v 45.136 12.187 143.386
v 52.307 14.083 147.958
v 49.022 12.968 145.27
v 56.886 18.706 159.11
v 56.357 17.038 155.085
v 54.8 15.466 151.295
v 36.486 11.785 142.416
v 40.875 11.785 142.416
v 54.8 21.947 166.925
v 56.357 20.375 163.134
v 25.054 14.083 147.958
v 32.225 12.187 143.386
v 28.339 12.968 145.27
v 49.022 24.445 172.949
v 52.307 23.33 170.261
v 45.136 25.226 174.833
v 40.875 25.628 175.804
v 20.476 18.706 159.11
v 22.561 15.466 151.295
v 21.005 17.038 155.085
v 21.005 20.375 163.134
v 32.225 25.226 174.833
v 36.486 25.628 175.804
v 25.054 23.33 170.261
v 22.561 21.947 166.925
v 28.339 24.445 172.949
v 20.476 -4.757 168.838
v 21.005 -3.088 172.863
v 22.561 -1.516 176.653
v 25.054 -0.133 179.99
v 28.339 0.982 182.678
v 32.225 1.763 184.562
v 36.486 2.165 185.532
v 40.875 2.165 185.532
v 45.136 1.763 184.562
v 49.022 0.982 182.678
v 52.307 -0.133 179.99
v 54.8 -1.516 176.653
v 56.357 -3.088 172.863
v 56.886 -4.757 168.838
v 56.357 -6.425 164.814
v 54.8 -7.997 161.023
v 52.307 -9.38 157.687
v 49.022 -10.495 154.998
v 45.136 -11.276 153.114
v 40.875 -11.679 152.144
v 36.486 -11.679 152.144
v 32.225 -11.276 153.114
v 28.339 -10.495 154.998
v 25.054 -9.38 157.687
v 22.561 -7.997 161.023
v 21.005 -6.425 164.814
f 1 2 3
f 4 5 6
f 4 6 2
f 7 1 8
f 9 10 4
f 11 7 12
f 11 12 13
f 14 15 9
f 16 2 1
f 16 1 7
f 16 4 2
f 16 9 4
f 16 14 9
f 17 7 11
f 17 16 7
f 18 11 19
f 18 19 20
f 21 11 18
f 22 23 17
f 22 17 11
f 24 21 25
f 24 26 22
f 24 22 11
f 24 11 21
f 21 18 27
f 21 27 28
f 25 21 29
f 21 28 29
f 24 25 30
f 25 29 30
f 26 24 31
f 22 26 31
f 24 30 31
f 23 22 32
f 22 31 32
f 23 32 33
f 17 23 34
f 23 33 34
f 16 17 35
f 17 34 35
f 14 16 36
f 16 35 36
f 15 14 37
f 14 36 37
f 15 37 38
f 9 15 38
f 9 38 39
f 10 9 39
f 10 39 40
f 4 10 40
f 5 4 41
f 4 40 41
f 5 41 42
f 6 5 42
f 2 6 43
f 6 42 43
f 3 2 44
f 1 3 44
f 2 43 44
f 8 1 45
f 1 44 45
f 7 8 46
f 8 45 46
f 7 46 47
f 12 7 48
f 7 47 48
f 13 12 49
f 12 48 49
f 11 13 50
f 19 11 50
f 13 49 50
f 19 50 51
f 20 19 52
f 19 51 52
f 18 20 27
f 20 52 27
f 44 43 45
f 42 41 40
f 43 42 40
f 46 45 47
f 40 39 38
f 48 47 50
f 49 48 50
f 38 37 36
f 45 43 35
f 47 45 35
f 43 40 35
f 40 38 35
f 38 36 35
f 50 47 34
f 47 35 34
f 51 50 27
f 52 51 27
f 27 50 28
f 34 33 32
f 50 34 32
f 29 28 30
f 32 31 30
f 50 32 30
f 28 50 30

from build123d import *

# Parameters (mm, degrees)
F4_DEPTH     = 31.75
F6_DEPTH     = 80.772
F7_W         = 115.0478571653
F7_H         = 280.0295129418
F8_DEPTH     = 80.01
F10_R        = 5.08
F11_R        = 5.08
F12_R        = 1.27
F13_T4_DEPTH = 185.7457951761
F13_T9_DEPTH = 185.7457951761
F15_R        = 18.2048484519
F16_DEPTH    = 25.4


# Not quite as in the source:
# - a fillet or chamfer that OpenCascade refuses, or shapes differently, is made with other operations: its cross-section is extruded or revolved along the edge and cut away or added
# - a feature of the source that left no trace in its solid (it failed there, or was rolled back) is left out


with BuildPart() as f4:
    # F3 (on Right) → F4 (new body, symmetric)
    with BuildSketch(Plane.YZ):
        Polygon((33.4092862904, 0), (34.8578840494, 0), (34.8578840494, 165.3004437685), (51.5383556485, 200.2867460251), (45.9728437156, 202.9402234647), (21.1225822568, 165.3004437685), align=None)
    extrude(amount=F4_DEPTH, both=True)

    # F5 (on Front) → F6 (cut, symmetric)
    with BuildSketch(Plane.XZ):
        Polygon((-36.7620885372, 0), (-2.4731955491, 0), (-9.2842681333, 165.0800704956), (-36.7620885372, 165.0800704956), align=None)
    extrude(amount=F6_DEPTH, both=True, mode=Mode.SUBTRACT)

    # F7 (on Front) → F8 (cut)
    with BuildSketch(Plane.XZ):
        with Locations((57.5239285827, 90.4524587095)):
            Rectangle(F7_W, F7_H)
    extrude(amount=-F8_DEPTH, mode=Mode.SUBTRACT)

    # F9: F4 across face


with BuildPart() as f4_1:
    add(f4.part)
    add(f4.part.mirror(Plane(origin=(0, 31.8435446529, 122.6723093361), x_dir=(0, 1, 0), z_dir=(1, 0, 0))))

    # F10
    f10_edges = [f4_1.edges().sort_by_distance(p)[0] for p in [
        (-9.284268, 27.998423, 165.08007),
        (9.284268, 27.998423, 165.08007),
        (31.75, 27.998423, 165.08007),
        (-31.75, 27.998423, 165.08007),
    ]]
    fillet(f10_edges, radius=F10_R)

    # F11
    f11_edges = [f4_1.edges().sort_by_distance(p)[0] for p in [
        (-31.75, 48.7556, 201.613485),
        (31.75, 48.7556, 201.613485),
    ]]
    fillet(f11_edges, radius=F11_R)

    # F12
    f12_edges = [f4_1.edges().sort_by_distance(p)[0] for p in [
        (-31.75, 33.738898, 184.409914),
    ]]
    fillet(f12_edges, radius=F12_R)

    # F13: fillet of radius 5.08 on 2 edges, made by hand


with BuildPart() as f13_tool2:
    # F13_s3 → F13_t4 (new body)
    with BuildSketch(Plane(origin=(7.1378657639, 0, 173.0005617946), x_dir=(0, 1, 0), z_dir=(-0.0412241322, 0, -0.9991499241))):
        with BuildLine():
            ThreePointArc((29.7778840494, 2.4710931453), (33.3699864978, 0.9831955937), (34.8578840494, -2.6089068547))
            Line((34.8578840494, -2.6089068547), (34.8578840494, 2.4710931453))
            Line((34.8578840494, 2.4710931453), (29.7778840494, 2.4710931453))
        make_face()
    extrude(amount=F13_T4_DEPTH)

    split(bisect_by=Plane(origin=(0, -35.8121563615, 17.0742152946), x_dir=(1, 0, 0), z_dir=(0, 0.902656838, -0.4303610493)), keep=Keep.TOP)


with BuildPart() as f4_2:
    add(f4_1.part)

    # F13_t1: cut F13_tool2
    add(f13_tool2.part, mode=Mode.SUBTRACT)


with BuildPart() as f13_tool7:
    # F13_s8 → F13_t9 (new body)
    with BuildSketch(Plane(origin=(-7.1378657639, 0, 173.0005617946), x_dir=(0, 1, 0), z_dir=(0.0412241322, 0, -0.9991499241))):
        with BuildLine():
            ThreePointArc((29.7778840494, -2.4710931453), (33.3699864978, -0.9831955937), (34.8578840494, 2.6089068547))
            Line((34.8578840494, 2.6089068547), (34.8578840494, -2.4710931453))
            Line((34.8578840494, -2.4710931453), (29.7778840494, -2.4710931453))
        make_face()
    extrude(amount=F13_T9_DEPTH)

    split(bisect_by=Plane(origin=(0, -35.8121563615, 17.0742152946), x_dir=(1, 0, 0), z_dir=(0, 0.902656838, -0.4303610493)), keep=Keep.TOP)


with BuildPart() as f4_3:
    add(f4_2.part)

    # F13_t6: cut F13_tool7
    add(f13_tool7.part, mode=Mode.SUBTRACT)


with BuildPart() as f16:
    # F15 (on line) → F16 (new body)
    with BuildSketch(Plane(origin=(0, -63.794974886, 26.4515642177), x_dir=(-1, 0, 0), z_dir=(0, 0.9237421686, -0.3830148901))):
        with Locations((-38.6807657778, 154.1410535574)):
            Circle(F15_R)
    extrude(amount=F16_DEPTH)


solid = f16.part
